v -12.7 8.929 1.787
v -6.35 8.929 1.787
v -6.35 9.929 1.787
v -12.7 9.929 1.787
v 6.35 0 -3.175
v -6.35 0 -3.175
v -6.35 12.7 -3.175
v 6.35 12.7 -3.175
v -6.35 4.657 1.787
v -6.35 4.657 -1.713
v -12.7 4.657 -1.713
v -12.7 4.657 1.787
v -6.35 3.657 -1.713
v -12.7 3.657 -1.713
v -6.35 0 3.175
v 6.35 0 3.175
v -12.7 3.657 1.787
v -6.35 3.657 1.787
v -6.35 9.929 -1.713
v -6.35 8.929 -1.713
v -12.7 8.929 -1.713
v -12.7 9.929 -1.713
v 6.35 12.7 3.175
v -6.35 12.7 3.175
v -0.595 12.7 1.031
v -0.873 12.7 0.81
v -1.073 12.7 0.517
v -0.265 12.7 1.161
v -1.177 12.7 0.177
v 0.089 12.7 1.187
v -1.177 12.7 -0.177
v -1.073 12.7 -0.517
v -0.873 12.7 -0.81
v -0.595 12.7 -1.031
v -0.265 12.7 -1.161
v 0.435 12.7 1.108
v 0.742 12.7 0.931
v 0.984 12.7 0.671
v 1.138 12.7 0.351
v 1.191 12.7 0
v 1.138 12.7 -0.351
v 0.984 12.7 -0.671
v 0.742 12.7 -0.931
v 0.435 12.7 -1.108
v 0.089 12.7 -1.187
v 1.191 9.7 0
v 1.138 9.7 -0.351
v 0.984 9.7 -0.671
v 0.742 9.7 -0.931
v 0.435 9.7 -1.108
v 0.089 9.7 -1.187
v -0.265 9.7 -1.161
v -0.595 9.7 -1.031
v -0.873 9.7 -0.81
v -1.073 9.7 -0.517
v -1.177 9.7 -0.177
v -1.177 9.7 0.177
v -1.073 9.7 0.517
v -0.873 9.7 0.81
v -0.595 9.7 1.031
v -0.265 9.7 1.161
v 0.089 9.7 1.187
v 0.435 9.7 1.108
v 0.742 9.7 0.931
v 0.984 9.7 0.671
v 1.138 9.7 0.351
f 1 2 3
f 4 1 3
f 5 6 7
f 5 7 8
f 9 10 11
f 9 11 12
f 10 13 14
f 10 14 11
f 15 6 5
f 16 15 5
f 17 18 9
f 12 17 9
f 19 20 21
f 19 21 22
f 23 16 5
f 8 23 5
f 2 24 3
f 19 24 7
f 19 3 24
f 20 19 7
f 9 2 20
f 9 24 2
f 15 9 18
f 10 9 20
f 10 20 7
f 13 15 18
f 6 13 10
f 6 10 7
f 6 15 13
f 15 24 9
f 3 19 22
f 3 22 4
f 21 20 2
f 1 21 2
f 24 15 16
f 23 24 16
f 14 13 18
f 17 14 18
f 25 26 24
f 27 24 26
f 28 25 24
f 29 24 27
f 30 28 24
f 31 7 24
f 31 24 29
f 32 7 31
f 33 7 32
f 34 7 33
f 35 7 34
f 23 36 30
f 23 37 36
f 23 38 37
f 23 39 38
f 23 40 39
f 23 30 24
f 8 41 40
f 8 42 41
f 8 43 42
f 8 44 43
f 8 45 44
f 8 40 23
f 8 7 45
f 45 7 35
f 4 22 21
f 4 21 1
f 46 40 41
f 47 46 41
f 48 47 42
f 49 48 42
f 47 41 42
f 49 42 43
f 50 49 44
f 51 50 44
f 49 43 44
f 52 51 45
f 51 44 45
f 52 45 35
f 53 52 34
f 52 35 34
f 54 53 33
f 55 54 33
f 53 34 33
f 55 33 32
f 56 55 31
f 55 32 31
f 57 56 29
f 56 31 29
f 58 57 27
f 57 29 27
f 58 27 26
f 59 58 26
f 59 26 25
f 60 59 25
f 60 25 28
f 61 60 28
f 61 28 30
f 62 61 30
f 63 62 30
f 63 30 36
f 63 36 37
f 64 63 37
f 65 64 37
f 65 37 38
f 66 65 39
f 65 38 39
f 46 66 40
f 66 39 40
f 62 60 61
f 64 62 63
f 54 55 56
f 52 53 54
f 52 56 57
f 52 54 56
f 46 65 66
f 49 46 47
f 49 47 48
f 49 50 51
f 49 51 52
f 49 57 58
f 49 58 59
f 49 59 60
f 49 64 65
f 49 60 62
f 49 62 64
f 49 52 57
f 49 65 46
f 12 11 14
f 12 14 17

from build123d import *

# Parameters (mm, degrees)
SKETCH1_W           = 12.7
SKETCH1_H           = 6.35
BOSS_EXTRUDE1_DEPTH = 12.7
SKETCH2_R           = 1.190625
CUT_EXTRUDE1_DEPTH  = 3
SKETCH3_W           = 3.5
SKETCH3_H           = 1
BOSS_EXTRUDE2_DEPTH = 6.35


with BuildPart() as part:
    # Sketch1 → Boss-Extrude1 (new body)
    with BuildSketch(Plane(origin=(0, 0, 0), x_dir=(1, 0, 0), z_dir=(0, 1, 0))):
        Rectangle(SKETCH1_W, SKETCH1_H)
    extrude(amount=BOSS_EXTRUDE1_DEPTH)

    # Sketch2 → Cut-Extrude1 (cut)
    with BuildSketch(Plane(origin=(0, 12.7, 0), x_dir=(1, 0, 0), z_dir=(0, 1, 0))):
        Circle(SKETCH2_R)
    extrude(amount=-CUT_EXTRUDE1_DEPTH, mode=Mode.SUBTRACT)

    # Sketch3 → Boss-Extrude2 (add)
    with BuildSketch(Plane.ZY.offset(6.35)):
        with Locations((0.037458048, 4.156500498)):
            Rectangle(SKETCH3_W, SKETCH3_H)
        with Locations((0.037458048, 9.428549286)):
            Rectangle(SKETCH3_W, SKETCH3_H)
    extrude(amount=BOSS_EXTRUDE2_DEPTH)


solid = part.part
